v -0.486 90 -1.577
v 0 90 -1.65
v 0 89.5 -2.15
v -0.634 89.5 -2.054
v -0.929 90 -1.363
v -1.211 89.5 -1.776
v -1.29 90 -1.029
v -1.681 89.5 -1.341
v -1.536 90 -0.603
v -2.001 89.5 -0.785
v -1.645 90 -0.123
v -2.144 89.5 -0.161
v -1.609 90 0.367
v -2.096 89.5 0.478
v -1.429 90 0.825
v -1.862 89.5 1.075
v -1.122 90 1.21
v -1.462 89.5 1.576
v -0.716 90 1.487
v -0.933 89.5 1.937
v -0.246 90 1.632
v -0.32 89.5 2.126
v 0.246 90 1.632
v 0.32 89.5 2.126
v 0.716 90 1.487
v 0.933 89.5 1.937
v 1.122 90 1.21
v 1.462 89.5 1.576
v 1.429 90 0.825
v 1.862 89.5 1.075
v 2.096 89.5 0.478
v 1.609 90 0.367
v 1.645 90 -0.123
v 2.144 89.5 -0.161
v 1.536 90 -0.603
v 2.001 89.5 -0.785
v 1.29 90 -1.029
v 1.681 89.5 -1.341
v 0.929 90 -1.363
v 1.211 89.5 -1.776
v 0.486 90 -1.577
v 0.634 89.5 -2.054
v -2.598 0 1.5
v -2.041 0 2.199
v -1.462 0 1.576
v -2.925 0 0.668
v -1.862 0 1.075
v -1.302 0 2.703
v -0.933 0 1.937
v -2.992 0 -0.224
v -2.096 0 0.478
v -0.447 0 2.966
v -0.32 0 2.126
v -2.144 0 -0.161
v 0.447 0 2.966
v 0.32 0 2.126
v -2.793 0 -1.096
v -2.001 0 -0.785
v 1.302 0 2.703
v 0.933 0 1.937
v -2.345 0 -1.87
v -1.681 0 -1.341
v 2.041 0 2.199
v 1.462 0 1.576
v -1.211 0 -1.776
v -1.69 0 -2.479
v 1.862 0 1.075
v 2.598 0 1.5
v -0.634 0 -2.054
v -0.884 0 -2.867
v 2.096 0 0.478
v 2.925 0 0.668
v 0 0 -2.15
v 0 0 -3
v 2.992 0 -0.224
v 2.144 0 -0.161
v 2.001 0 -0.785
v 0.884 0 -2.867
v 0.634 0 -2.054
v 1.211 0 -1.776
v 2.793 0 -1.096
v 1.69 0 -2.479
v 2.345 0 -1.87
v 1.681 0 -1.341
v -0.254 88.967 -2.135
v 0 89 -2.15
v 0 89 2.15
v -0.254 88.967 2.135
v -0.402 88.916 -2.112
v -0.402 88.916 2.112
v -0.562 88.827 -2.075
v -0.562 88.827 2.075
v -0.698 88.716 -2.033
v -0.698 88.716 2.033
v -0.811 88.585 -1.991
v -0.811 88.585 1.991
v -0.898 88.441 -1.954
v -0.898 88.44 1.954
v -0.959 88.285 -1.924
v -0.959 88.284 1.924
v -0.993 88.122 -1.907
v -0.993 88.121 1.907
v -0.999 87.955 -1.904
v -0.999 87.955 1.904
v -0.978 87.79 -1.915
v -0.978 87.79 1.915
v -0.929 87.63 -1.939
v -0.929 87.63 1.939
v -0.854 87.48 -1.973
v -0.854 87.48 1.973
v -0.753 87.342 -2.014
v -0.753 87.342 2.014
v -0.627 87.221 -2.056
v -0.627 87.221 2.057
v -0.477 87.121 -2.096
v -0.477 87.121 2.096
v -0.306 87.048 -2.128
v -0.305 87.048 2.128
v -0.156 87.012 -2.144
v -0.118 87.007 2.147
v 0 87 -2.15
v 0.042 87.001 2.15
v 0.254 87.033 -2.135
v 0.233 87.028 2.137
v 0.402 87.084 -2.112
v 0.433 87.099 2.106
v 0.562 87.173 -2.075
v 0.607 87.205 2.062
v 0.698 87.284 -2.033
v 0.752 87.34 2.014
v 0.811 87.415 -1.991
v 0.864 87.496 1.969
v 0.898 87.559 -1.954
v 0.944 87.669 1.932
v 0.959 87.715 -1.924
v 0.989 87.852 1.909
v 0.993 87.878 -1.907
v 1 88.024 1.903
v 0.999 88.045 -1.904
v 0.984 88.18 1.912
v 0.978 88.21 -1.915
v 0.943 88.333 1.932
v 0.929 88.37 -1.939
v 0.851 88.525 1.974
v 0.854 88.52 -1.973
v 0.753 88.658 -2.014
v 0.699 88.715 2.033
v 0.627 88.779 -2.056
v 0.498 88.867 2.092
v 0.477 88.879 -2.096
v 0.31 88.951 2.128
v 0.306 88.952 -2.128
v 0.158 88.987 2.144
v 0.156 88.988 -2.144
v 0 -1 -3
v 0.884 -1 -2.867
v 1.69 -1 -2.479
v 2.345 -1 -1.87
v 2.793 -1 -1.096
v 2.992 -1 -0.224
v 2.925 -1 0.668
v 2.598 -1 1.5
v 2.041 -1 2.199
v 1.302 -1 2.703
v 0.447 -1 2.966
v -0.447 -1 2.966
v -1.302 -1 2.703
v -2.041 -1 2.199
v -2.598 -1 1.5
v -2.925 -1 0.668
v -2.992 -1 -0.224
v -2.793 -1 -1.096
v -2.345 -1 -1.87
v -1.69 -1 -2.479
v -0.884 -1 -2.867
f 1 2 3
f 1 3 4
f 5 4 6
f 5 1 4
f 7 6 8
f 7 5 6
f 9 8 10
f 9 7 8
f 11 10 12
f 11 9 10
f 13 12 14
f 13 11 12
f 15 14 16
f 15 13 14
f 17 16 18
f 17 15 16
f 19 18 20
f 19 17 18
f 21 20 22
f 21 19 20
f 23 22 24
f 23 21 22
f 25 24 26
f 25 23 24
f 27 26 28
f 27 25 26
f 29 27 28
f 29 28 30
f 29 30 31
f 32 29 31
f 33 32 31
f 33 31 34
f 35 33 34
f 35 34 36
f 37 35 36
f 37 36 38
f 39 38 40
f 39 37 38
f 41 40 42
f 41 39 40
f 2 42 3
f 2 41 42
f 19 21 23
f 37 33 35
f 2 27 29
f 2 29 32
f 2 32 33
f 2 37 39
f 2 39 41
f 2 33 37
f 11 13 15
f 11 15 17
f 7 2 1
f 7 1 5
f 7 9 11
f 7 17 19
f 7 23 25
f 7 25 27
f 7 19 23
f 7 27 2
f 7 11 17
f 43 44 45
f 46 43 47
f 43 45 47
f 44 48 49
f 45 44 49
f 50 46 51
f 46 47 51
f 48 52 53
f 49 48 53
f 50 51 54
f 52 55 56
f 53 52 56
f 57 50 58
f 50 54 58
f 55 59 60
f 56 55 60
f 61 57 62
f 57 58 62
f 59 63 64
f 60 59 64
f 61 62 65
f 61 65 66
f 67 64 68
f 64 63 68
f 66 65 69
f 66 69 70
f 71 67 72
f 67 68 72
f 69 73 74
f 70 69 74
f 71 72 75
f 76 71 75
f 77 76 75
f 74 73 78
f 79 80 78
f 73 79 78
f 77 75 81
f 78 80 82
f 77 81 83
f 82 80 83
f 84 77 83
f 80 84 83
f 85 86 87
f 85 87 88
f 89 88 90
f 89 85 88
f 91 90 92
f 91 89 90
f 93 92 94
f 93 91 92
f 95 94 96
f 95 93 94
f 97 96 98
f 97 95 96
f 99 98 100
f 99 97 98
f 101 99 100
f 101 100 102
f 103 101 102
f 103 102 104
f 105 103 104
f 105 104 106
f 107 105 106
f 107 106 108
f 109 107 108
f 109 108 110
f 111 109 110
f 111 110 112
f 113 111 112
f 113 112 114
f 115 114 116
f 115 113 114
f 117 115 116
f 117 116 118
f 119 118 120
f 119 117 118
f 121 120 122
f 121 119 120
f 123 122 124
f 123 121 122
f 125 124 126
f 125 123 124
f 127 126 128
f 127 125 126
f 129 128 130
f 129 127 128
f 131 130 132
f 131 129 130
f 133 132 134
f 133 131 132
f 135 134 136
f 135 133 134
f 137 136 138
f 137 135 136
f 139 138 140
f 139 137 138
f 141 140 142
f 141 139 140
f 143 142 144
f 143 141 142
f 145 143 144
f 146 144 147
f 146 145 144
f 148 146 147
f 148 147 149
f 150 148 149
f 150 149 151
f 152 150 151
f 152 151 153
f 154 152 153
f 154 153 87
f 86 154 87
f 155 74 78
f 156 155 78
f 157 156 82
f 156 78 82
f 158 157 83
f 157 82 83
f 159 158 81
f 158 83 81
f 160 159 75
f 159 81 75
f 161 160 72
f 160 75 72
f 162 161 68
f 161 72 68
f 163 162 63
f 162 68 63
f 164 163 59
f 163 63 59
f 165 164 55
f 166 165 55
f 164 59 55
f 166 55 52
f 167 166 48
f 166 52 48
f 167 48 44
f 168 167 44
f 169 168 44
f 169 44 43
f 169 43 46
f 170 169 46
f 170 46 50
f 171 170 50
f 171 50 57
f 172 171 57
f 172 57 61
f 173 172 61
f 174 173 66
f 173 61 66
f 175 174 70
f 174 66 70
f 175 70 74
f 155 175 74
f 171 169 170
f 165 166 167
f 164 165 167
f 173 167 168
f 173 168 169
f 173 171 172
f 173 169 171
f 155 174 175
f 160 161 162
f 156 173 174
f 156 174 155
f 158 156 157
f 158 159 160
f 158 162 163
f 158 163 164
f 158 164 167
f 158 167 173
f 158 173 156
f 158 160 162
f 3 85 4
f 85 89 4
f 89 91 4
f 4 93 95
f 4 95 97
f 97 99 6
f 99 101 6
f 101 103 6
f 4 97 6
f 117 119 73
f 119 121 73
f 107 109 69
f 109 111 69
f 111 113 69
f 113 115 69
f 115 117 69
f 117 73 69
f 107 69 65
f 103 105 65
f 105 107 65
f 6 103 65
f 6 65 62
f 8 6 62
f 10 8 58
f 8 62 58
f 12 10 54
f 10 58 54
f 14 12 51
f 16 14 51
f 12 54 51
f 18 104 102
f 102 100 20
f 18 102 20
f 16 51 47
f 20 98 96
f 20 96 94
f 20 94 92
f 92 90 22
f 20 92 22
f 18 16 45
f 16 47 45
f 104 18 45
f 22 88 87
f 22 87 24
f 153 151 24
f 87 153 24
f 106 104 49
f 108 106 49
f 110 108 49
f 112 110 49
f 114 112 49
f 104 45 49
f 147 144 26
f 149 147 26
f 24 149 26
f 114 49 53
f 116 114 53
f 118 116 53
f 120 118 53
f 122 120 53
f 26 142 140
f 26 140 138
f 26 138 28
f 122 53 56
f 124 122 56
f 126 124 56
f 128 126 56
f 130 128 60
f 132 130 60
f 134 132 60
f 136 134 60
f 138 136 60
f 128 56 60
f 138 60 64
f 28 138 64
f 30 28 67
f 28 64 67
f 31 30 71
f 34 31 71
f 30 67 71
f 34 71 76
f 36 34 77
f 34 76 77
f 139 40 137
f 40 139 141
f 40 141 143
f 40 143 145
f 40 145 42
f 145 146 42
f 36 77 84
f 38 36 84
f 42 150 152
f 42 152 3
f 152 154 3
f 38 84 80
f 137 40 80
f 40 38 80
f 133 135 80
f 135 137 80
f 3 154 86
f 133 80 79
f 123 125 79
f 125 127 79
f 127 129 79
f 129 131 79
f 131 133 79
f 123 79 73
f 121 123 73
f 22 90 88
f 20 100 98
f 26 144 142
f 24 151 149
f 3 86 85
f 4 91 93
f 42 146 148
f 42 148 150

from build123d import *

# Parameters (mm, degrees)
SKETCH1_R               = 2.15
BOSS_EXTRUDE1_DEPTH     = 90
CHAMFER1_SIZE           = 0.5
SKETCH2_R               = 3
BOSS_EXTRUDE2_DEPTH     = 1
CUT_EXTRUDE1_DEPTH      = 91.099944506
CUT_EXTRUDE1_DEPTH_BACK = 91.099944506
SKETCH3_R               = 1


with BuildPart() as part:
    # Sketch1 → Boss-Extrude1 (new body)
    with BuildSketch(Plane(origin=(0, 0, 0), x_dir=(1, 0, 0), z_dir=(0, 1, 0))):
        with Locations(Location((0, 0, 0), (0, 0, 90))):
            Circle(SKETCH1_R)
    extrude(amount=BOSS_EXTRUDE1_DEPTH)

    # Chamfer1
    chamfer1_edges = [part.edges().sort_by_distance(p)[0] for p in [
        (0, 90, 2.15),
    ]]
    chamfer(chamfer1_edges, length=CHAMFER1_SIZE)

    # Sketch2 → Boss-Extrude2 (add)
    with BuildSketch(Plane(origin=(0, 0, 0), x_dir=(-1, 0, 0), z_dir=(0, -1, 0))):
        with Locations(Location((0, 0, 0), (0, 0, 90))):
            Circle(SKETCH2_R)
    extrude(amount=BOSS_EXTRUDE2_DEPTH)

    # Sketch3 → Cut-Extrude1 (cut, two sides: drawn at the far end of the back side and taken through both)
    with BuildSketch(Plane.XY.offset(-CUT_EXTRUDE1_DEPTH_BACK)):
        with Locations(Location((0, 88, 0), (0, 0, 89.999999996))):
            Circle(SKETCH3_R)
    extrude(amount=CUT_EXTRUDE1_DEPTH + CUT_EXTRUDE1_DEPTH_BACK, mode=Mode.SUBTRACT)


solid = part.part
